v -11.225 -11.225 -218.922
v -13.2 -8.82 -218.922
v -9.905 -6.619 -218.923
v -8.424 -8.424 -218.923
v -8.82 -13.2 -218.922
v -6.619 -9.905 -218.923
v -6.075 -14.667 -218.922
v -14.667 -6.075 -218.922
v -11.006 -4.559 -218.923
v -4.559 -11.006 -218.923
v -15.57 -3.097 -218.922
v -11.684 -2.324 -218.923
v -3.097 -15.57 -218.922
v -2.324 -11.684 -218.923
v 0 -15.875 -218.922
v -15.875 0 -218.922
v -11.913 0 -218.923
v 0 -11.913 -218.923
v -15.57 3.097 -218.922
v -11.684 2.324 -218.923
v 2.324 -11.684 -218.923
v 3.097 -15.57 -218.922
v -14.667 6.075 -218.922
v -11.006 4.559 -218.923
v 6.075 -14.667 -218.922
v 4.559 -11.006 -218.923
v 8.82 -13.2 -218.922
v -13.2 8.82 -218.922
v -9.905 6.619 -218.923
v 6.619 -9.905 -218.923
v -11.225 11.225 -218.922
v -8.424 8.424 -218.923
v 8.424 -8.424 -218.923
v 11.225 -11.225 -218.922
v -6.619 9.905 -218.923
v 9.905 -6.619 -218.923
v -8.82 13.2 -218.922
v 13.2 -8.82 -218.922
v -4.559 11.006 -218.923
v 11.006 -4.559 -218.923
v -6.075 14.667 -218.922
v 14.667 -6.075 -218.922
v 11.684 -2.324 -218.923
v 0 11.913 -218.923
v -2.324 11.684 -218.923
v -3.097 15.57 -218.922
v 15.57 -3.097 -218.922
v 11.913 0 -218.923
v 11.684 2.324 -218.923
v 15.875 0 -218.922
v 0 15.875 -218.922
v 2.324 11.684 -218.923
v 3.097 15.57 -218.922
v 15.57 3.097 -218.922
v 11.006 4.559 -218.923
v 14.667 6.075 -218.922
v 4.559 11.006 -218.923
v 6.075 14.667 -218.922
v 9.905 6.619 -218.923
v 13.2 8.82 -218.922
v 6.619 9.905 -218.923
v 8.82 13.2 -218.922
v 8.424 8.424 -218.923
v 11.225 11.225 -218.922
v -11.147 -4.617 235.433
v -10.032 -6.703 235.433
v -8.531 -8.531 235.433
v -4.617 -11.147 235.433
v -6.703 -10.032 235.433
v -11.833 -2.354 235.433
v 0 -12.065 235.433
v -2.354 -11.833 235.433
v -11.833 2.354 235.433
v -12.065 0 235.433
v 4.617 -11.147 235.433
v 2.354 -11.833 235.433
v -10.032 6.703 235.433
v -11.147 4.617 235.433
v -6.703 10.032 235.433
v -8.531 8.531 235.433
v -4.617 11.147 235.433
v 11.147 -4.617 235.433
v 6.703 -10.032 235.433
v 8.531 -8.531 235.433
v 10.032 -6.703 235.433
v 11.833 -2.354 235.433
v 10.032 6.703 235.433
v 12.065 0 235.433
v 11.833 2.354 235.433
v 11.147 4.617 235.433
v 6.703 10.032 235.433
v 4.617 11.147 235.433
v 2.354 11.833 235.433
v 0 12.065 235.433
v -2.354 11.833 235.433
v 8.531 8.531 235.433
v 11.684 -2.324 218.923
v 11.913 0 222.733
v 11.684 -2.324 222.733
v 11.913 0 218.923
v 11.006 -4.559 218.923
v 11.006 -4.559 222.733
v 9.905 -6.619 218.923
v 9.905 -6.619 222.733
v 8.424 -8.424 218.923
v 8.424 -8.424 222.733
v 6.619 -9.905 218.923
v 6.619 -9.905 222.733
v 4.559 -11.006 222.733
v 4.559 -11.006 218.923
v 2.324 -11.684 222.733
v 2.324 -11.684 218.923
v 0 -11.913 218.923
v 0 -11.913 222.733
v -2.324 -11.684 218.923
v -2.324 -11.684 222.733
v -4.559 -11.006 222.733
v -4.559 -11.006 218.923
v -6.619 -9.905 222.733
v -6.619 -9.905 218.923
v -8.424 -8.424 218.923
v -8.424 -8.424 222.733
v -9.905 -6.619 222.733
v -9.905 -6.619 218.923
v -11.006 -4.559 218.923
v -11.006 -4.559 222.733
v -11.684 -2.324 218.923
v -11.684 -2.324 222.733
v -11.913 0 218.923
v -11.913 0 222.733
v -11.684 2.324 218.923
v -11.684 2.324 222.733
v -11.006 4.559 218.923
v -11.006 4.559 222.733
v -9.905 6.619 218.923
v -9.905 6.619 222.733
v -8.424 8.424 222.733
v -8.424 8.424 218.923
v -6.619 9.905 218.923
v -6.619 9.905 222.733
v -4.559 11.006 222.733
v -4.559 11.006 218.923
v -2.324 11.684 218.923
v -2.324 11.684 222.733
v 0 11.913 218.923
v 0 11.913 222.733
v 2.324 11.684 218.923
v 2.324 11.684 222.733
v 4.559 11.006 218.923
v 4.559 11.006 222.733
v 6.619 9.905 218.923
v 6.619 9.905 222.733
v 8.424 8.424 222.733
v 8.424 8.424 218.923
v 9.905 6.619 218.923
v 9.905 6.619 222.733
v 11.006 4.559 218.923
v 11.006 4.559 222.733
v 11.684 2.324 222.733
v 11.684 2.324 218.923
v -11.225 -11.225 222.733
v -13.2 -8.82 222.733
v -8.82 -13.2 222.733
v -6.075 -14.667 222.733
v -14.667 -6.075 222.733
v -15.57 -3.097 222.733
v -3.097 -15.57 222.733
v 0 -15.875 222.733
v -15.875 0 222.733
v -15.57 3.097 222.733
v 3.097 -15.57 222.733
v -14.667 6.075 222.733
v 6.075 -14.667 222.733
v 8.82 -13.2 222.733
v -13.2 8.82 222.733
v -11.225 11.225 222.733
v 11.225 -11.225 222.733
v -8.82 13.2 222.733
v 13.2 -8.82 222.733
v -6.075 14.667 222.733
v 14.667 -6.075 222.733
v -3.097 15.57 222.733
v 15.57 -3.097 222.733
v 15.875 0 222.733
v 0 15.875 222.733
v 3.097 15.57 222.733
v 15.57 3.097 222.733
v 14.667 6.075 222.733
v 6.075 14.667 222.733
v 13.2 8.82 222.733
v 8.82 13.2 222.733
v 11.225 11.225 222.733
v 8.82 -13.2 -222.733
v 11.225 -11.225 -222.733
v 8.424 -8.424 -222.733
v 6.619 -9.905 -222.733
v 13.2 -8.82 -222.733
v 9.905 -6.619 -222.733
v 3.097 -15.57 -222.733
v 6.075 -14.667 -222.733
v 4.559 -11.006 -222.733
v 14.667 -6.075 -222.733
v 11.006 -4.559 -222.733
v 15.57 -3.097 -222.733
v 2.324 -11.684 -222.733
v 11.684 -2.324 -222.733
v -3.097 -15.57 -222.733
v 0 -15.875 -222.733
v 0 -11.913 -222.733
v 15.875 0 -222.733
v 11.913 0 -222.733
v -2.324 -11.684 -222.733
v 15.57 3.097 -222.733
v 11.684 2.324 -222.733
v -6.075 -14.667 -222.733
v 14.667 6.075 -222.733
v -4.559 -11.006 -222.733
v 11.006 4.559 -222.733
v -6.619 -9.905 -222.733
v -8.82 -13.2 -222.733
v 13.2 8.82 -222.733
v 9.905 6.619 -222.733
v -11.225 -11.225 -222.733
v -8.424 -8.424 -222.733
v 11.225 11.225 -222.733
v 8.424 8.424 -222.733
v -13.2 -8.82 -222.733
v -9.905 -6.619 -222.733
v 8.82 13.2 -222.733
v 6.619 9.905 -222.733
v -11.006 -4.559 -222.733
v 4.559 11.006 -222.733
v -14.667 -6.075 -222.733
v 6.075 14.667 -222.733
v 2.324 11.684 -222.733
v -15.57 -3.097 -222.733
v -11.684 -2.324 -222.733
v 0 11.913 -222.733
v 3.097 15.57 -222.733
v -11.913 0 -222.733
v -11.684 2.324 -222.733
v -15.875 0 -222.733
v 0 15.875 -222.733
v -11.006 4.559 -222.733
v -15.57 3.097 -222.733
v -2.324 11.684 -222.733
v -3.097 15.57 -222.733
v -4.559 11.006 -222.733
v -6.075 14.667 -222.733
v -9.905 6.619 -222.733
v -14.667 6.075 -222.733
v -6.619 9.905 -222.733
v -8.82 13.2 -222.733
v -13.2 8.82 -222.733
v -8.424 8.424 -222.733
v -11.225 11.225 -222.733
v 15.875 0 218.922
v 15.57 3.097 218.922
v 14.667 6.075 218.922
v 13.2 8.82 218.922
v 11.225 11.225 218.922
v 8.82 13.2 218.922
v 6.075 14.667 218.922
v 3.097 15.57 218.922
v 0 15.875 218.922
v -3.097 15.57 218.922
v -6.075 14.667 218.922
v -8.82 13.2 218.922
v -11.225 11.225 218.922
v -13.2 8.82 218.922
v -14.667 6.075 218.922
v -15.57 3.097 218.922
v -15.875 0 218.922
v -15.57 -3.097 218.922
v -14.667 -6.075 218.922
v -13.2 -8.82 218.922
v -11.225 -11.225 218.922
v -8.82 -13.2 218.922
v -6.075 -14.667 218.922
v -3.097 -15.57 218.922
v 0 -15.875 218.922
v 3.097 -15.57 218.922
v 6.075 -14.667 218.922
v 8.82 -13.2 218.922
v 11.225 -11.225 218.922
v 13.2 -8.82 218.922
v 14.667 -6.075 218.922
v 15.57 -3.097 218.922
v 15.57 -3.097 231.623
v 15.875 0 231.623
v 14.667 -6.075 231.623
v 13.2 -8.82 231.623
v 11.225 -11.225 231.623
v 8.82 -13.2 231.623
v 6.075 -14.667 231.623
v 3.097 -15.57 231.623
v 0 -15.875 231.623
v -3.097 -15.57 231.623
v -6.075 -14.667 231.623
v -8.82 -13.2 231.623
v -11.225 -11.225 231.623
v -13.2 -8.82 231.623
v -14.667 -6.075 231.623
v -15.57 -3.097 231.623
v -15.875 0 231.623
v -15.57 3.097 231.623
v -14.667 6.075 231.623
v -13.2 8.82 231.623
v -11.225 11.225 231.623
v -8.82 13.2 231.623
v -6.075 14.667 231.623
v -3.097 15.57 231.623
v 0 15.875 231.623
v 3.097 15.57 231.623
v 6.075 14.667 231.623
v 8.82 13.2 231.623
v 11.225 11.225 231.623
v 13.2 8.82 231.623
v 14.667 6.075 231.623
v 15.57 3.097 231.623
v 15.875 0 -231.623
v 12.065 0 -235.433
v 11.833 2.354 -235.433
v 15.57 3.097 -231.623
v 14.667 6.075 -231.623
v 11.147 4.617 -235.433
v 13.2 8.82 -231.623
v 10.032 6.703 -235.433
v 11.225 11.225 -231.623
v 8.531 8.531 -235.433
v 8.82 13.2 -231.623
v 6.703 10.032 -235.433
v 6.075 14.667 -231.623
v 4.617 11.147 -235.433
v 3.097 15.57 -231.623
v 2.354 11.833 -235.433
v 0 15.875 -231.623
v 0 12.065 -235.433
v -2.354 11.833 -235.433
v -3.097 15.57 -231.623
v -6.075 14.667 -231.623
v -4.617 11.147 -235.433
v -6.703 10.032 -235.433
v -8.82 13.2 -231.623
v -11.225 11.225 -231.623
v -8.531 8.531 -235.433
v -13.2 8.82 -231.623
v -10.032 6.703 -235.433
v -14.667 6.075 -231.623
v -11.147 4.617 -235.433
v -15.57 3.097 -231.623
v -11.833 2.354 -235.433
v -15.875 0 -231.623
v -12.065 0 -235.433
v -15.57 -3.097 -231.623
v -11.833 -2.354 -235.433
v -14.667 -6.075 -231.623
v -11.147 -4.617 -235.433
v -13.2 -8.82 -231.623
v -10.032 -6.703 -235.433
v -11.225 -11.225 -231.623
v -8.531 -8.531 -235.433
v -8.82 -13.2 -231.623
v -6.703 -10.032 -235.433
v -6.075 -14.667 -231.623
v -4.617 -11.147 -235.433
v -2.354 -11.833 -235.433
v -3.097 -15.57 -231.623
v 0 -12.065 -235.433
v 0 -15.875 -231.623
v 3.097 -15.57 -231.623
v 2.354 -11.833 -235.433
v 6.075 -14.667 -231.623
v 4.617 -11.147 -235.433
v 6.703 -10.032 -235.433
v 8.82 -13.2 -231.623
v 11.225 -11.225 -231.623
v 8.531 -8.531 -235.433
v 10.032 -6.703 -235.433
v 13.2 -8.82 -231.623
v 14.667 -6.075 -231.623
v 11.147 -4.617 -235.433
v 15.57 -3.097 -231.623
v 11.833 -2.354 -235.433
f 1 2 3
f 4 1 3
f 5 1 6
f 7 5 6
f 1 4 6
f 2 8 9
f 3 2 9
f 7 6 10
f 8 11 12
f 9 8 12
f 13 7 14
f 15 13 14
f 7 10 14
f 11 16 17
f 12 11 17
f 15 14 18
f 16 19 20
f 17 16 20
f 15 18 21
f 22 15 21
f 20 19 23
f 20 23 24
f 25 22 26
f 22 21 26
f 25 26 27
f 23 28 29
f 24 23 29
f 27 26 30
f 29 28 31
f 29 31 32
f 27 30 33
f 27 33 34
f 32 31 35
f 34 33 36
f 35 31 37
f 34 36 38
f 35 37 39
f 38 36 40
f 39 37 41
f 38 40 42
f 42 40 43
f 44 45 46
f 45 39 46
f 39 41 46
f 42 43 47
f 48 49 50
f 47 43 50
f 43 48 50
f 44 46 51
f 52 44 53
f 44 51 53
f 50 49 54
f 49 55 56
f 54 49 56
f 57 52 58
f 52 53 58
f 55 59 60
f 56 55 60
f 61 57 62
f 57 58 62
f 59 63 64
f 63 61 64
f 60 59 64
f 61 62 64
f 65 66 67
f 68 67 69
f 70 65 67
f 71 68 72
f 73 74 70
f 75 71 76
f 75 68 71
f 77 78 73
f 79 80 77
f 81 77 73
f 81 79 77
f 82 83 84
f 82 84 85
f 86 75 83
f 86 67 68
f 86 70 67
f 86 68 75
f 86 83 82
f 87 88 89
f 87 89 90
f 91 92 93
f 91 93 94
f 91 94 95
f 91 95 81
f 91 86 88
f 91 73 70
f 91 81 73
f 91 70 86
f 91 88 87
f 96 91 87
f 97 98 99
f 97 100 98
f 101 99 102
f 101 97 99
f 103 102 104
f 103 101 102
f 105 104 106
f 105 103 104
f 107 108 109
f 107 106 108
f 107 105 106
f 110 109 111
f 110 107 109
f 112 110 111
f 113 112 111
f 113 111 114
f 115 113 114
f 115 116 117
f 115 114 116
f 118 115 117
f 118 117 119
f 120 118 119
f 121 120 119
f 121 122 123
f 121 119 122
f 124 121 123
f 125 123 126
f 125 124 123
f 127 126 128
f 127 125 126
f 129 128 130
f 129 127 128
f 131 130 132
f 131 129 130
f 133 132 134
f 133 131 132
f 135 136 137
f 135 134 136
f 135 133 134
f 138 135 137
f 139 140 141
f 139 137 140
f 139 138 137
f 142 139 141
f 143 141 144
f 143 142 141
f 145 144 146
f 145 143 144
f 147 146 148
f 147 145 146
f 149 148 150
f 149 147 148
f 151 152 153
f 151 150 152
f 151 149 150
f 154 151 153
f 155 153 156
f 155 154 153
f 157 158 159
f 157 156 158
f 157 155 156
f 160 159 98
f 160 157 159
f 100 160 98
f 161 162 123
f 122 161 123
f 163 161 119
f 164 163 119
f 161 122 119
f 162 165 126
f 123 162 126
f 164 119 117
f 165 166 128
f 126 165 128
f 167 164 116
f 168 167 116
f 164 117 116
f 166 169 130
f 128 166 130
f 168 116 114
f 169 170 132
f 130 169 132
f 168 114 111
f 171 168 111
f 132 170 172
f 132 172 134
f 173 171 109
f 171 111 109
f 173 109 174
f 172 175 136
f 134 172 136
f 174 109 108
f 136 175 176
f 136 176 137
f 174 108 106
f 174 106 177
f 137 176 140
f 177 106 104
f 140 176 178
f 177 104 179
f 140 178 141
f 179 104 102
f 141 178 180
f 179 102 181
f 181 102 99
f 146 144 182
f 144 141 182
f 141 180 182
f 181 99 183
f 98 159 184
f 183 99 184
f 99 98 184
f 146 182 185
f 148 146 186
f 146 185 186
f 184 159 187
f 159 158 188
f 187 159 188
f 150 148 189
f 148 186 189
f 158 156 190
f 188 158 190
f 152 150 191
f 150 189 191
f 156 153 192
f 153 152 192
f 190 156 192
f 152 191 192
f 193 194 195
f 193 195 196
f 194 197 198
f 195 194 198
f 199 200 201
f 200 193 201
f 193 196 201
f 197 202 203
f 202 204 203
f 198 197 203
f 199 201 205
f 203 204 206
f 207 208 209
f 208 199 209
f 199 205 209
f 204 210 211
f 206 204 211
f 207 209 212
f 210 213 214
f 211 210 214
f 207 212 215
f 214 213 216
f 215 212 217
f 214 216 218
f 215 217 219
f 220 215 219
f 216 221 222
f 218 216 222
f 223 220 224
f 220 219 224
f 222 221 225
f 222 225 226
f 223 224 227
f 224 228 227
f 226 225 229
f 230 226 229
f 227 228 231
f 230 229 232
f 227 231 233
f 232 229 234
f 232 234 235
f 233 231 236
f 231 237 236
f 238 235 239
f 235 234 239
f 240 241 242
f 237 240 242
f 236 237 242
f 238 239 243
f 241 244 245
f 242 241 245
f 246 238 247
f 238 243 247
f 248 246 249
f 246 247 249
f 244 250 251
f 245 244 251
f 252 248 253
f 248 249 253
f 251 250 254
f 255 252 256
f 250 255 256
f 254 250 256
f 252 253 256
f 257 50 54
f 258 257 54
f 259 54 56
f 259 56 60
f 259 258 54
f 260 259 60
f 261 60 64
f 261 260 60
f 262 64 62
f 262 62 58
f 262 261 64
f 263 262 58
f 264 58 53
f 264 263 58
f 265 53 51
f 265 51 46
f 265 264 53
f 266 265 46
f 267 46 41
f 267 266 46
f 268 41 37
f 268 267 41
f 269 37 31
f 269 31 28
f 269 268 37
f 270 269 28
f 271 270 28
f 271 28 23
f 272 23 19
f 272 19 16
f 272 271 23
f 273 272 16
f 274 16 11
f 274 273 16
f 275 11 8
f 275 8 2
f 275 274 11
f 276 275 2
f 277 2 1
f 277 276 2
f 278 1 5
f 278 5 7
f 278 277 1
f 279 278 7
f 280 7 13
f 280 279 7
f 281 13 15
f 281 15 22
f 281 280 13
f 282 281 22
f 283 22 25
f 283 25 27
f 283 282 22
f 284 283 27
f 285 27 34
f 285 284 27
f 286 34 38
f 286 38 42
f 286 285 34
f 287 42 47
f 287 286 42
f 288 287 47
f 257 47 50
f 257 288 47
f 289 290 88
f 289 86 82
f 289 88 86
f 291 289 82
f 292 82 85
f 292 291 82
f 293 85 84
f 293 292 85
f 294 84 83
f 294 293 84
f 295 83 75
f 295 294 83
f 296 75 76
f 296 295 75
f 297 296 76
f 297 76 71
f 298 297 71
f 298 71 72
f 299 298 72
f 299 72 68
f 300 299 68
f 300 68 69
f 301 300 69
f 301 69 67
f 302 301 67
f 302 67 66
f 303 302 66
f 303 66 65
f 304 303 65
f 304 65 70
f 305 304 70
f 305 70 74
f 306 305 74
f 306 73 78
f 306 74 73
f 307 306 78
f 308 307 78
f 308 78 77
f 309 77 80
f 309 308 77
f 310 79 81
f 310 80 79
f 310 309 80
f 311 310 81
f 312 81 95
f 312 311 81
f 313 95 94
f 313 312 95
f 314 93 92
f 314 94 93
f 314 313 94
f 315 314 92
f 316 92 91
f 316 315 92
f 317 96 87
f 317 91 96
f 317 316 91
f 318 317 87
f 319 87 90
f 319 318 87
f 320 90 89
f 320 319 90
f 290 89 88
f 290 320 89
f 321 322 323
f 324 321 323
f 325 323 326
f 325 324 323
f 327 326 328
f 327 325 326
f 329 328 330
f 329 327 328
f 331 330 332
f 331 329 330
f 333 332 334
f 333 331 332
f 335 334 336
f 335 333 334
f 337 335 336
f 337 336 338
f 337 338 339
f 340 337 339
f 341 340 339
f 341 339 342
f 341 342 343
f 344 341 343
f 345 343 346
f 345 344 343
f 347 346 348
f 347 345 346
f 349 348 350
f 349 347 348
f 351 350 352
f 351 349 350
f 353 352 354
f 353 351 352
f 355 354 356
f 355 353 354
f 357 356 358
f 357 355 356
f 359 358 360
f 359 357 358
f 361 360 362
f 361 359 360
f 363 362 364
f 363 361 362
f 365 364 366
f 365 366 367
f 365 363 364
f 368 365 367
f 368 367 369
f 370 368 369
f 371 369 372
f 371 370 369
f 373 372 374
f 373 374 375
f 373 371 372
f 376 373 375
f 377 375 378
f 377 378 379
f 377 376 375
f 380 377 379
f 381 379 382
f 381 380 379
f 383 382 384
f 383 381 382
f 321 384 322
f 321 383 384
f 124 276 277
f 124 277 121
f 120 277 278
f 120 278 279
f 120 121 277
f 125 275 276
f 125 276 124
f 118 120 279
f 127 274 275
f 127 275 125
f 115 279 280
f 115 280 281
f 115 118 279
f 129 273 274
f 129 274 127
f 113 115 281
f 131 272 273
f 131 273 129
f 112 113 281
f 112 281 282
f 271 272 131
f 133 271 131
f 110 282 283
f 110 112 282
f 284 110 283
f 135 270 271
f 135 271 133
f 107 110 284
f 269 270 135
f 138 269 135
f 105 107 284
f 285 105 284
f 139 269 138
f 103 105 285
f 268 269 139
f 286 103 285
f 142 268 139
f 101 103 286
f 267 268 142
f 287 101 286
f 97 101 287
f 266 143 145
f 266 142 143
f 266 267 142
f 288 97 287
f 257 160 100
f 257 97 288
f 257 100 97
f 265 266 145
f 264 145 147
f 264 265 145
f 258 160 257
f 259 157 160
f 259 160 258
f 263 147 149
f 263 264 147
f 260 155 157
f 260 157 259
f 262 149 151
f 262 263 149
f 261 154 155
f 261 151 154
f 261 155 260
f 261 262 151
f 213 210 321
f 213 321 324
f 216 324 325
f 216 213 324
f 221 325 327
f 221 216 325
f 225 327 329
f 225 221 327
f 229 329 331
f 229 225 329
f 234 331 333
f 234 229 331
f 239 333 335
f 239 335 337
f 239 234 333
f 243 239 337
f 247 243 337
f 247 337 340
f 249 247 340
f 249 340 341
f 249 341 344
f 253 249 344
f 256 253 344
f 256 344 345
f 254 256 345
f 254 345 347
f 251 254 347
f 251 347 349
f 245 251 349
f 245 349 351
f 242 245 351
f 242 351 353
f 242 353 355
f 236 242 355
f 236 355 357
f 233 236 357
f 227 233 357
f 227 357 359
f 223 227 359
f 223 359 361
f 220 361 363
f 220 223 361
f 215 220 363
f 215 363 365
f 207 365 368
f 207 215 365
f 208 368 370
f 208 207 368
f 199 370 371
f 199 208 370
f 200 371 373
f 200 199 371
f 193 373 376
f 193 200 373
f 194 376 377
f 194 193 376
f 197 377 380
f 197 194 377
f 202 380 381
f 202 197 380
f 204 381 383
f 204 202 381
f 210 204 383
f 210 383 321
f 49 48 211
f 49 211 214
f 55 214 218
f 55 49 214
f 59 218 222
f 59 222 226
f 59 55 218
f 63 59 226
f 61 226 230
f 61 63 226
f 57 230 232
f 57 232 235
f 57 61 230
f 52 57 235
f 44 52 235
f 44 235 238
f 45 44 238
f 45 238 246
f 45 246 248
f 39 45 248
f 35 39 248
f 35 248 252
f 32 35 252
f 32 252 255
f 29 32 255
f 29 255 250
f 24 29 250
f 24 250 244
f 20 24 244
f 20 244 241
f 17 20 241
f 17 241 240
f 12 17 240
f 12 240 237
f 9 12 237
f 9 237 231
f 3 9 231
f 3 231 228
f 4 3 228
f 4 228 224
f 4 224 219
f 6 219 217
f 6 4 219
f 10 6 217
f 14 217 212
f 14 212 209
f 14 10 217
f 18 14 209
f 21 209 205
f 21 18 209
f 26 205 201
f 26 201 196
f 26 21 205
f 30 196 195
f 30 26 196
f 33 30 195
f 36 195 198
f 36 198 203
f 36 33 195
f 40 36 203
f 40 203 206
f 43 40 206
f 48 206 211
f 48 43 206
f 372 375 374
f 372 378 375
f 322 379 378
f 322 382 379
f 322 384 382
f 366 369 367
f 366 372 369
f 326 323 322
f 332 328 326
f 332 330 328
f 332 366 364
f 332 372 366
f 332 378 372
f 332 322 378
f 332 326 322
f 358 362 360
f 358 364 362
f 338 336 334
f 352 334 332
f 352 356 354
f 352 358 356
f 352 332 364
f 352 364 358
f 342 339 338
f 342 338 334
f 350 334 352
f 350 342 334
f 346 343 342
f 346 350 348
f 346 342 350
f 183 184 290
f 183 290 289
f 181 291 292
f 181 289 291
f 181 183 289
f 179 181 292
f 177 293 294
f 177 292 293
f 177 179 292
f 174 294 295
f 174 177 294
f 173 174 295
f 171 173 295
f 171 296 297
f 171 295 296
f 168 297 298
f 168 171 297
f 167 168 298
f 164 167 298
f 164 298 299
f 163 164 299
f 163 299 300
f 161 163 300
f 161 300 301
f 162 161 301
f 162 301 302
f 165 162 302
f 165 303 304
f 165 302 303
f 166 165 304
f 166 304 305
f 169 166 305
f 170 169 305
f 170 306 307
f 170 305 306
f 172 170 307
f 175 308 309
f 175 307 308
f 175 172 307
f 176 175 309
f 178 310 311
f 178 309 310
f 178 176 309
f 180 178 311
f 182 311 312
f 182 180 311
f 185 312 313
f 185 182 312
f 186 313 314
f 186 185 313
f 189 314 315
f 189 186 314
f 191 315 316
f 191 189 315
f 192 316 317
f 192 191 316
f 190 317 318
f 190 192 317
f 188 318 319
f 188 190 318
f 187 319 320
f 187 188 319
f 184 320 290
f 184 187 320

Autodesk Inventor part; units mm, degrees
ref_plane "YZ Plane" through (0, 0, 0) normal (1, 0, 0) x (0, 1, 0)
ref_plane "XZ Plane" through (0, 0, 0) normal (0, 1, 0) x (-1, 0, 0)
ref_plane "XY Plane" through (0, 0, 0) normal (0, 0, 1) x (1, 0, 0)
sketch "Sketch1" plane through (0, 0, 0) normal (0, 0, 1) x (1, 0, 0)
  circle A0 centre (0, 0) radius 1.5875
  dimension "d0" = 3.175
extrude "Extrusion1" add sketch "Sketch1" along normal mid plane 43.7845
sketch "Sketch2" plane through (0, 0, 21.8923) normal (0, 0, 1) x (1, 0, 0)
  circle A0 centre (0, 0) radius 1.1913
  dimension "d3" = 2.3825
extrude "Extrusion2" add sketch "Sketch2" along normal blind 0.381
sketch "Sketch3" plane through (0, 0, 22.2733) normal (0, 0, 1) x (1, 0, 0)
  circle A0 centre (0, 0) radius 1.5875
  dimension "d6" = 3.175
extrude "Extrusion3" add sketch "Sketch3" along normal blind 1.27
chamfer "Chamfer1" distance 0.381 angle 45 1 edges at (-1.5875, 0, 23.5433)
mirror "Mirror1" about plane through (0, 0, 0) normal (0, 0, 1) of "Extrusion3", "Chamfer1", "Extrusion1", "Extrusion2"
ref_plane "Work Plane1" through (0, 0, 0) normal (0, 0, 1) x (1, 0, 0)
scale "Scale1" factors (10, 10, 10) then translate (0, 0, 0) bodies 1
properties part number "Front Lower Hinge Pin"
